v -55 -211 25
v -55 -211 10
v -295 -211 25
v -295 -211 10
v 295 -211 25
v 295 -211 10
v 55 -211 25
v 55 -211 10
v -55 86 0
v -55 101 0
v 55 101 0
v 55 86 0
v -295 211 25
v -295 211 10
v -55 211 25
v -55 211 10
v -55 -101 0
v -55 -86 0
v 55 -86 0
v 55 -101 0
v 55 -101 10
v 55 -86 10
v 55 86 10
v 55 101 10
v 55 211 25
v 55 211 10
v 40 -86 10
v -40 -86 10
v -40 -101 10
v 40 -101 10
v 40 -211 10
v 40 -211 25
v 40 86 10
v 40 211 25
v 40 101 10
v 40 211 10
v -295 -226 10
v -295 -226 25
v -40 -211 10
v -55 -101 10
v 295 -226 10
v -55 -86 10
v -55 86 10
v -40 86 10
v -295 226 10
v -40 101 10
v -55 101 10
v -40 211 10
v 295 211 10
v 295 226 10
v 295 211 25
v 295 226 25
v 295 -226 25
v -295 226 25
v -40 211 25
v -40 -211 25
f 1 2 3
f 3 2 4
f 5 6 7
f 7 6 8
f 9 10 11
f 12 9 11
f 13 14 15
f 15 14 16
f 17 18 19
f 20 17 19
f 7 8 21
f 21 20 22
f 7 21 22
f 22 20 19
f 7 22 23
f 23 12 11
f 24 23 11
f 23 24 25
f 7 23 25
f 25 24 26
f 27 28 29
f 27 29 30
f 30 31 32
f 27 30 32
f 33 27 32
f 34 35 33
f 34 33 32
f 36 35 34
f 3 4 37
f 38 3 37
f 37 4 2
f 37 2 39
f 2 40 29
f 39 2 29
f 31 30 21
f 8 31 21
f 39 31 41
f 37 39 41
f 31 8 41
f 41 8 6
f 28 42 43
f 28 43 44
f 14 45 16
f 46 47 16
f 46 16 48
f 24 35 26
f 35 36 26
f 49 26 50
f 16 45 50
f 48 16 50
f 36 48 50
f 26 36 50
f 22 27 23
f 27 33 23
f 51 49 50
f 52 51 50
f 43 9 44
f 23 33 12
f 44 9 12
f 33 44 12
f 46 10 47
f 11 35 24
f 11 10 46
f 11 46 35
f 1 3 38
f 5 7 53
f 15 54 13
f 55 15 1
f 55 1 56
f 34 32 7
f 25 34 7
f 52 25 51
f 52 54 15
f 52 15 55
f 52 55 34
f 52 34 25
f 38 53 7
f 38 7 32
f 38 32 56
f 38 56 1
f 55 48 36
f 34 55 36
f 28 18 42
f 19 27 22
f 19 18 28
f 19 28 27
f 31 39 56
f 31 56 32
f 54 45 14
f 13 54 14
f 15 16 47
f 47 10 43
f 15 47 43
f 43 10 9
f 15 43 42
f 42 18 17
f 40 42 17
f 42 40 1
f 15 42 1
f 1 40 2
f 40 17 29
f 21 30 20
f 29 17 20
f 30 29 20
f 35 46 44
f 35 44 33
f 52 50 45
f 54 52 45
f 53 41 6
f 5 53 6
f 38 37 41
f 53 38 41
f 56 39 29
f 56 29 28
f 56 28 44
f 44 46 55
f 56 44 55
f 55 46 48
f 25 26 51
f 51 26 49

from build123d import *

# Parameters (mm, degrees)
SKETCH1_W        = 110
SKETCH1_H        = 15
EXTRUDE1_DEPTH   = 10
EXTRUDE1_2_DEPTH = 10
SKETCH2_W        = 80
SKETCH2_H        = 421.99984649
EXTRUDE2_DEPTH   = 15


with BuildPart() as part:
    # Sketch1 → Extrude1 (new body)
    with BuildSketch(Plane.XY):
        with Locations((0, 93.499923245)):
            Rectangle(SKETCH1_W, SKETCH1_H)
    extrude(amount=EXTRUDE1_DEPTH)



with BuildPart() as body_2:
    # Sketch1 → Extrude1 2 (new body)
    with BuildSketch(Plane.XY):
        with Locations((0, -93.499923245)):
            Rectangle(SKETCH1_W, SKETCH1_H)
    extrude(amount=EXTRUDE1_2_DEPTH)


with BuildPart() as part_1:
    add(part.part)

    add(body_2.part)  # Extrude2 merges body 2
    # Sketch2 → Extrude2 (add)
    with BuildSketch(Plane.XY.offset(10)):
        Polygon((55, -210.999923245), (55, 210.999923245), (295, 210.999923245), (295, 225.999923245), (-295, 225.999923245), (-295, 210.999923245), (-55, 210.999923245), (-55, -210.999923245), (-295, -210.999923245), (-295, -225.999923245), (295, -225.999923245), (295, -210.999923245), align=None)
        Rectangle(SKETCH2_W, SKETCH2_H, mode=Mode.SUBTRACT)
    extrude(amount=EXTRUDE2_DEPTH)


solid = part_1.part
